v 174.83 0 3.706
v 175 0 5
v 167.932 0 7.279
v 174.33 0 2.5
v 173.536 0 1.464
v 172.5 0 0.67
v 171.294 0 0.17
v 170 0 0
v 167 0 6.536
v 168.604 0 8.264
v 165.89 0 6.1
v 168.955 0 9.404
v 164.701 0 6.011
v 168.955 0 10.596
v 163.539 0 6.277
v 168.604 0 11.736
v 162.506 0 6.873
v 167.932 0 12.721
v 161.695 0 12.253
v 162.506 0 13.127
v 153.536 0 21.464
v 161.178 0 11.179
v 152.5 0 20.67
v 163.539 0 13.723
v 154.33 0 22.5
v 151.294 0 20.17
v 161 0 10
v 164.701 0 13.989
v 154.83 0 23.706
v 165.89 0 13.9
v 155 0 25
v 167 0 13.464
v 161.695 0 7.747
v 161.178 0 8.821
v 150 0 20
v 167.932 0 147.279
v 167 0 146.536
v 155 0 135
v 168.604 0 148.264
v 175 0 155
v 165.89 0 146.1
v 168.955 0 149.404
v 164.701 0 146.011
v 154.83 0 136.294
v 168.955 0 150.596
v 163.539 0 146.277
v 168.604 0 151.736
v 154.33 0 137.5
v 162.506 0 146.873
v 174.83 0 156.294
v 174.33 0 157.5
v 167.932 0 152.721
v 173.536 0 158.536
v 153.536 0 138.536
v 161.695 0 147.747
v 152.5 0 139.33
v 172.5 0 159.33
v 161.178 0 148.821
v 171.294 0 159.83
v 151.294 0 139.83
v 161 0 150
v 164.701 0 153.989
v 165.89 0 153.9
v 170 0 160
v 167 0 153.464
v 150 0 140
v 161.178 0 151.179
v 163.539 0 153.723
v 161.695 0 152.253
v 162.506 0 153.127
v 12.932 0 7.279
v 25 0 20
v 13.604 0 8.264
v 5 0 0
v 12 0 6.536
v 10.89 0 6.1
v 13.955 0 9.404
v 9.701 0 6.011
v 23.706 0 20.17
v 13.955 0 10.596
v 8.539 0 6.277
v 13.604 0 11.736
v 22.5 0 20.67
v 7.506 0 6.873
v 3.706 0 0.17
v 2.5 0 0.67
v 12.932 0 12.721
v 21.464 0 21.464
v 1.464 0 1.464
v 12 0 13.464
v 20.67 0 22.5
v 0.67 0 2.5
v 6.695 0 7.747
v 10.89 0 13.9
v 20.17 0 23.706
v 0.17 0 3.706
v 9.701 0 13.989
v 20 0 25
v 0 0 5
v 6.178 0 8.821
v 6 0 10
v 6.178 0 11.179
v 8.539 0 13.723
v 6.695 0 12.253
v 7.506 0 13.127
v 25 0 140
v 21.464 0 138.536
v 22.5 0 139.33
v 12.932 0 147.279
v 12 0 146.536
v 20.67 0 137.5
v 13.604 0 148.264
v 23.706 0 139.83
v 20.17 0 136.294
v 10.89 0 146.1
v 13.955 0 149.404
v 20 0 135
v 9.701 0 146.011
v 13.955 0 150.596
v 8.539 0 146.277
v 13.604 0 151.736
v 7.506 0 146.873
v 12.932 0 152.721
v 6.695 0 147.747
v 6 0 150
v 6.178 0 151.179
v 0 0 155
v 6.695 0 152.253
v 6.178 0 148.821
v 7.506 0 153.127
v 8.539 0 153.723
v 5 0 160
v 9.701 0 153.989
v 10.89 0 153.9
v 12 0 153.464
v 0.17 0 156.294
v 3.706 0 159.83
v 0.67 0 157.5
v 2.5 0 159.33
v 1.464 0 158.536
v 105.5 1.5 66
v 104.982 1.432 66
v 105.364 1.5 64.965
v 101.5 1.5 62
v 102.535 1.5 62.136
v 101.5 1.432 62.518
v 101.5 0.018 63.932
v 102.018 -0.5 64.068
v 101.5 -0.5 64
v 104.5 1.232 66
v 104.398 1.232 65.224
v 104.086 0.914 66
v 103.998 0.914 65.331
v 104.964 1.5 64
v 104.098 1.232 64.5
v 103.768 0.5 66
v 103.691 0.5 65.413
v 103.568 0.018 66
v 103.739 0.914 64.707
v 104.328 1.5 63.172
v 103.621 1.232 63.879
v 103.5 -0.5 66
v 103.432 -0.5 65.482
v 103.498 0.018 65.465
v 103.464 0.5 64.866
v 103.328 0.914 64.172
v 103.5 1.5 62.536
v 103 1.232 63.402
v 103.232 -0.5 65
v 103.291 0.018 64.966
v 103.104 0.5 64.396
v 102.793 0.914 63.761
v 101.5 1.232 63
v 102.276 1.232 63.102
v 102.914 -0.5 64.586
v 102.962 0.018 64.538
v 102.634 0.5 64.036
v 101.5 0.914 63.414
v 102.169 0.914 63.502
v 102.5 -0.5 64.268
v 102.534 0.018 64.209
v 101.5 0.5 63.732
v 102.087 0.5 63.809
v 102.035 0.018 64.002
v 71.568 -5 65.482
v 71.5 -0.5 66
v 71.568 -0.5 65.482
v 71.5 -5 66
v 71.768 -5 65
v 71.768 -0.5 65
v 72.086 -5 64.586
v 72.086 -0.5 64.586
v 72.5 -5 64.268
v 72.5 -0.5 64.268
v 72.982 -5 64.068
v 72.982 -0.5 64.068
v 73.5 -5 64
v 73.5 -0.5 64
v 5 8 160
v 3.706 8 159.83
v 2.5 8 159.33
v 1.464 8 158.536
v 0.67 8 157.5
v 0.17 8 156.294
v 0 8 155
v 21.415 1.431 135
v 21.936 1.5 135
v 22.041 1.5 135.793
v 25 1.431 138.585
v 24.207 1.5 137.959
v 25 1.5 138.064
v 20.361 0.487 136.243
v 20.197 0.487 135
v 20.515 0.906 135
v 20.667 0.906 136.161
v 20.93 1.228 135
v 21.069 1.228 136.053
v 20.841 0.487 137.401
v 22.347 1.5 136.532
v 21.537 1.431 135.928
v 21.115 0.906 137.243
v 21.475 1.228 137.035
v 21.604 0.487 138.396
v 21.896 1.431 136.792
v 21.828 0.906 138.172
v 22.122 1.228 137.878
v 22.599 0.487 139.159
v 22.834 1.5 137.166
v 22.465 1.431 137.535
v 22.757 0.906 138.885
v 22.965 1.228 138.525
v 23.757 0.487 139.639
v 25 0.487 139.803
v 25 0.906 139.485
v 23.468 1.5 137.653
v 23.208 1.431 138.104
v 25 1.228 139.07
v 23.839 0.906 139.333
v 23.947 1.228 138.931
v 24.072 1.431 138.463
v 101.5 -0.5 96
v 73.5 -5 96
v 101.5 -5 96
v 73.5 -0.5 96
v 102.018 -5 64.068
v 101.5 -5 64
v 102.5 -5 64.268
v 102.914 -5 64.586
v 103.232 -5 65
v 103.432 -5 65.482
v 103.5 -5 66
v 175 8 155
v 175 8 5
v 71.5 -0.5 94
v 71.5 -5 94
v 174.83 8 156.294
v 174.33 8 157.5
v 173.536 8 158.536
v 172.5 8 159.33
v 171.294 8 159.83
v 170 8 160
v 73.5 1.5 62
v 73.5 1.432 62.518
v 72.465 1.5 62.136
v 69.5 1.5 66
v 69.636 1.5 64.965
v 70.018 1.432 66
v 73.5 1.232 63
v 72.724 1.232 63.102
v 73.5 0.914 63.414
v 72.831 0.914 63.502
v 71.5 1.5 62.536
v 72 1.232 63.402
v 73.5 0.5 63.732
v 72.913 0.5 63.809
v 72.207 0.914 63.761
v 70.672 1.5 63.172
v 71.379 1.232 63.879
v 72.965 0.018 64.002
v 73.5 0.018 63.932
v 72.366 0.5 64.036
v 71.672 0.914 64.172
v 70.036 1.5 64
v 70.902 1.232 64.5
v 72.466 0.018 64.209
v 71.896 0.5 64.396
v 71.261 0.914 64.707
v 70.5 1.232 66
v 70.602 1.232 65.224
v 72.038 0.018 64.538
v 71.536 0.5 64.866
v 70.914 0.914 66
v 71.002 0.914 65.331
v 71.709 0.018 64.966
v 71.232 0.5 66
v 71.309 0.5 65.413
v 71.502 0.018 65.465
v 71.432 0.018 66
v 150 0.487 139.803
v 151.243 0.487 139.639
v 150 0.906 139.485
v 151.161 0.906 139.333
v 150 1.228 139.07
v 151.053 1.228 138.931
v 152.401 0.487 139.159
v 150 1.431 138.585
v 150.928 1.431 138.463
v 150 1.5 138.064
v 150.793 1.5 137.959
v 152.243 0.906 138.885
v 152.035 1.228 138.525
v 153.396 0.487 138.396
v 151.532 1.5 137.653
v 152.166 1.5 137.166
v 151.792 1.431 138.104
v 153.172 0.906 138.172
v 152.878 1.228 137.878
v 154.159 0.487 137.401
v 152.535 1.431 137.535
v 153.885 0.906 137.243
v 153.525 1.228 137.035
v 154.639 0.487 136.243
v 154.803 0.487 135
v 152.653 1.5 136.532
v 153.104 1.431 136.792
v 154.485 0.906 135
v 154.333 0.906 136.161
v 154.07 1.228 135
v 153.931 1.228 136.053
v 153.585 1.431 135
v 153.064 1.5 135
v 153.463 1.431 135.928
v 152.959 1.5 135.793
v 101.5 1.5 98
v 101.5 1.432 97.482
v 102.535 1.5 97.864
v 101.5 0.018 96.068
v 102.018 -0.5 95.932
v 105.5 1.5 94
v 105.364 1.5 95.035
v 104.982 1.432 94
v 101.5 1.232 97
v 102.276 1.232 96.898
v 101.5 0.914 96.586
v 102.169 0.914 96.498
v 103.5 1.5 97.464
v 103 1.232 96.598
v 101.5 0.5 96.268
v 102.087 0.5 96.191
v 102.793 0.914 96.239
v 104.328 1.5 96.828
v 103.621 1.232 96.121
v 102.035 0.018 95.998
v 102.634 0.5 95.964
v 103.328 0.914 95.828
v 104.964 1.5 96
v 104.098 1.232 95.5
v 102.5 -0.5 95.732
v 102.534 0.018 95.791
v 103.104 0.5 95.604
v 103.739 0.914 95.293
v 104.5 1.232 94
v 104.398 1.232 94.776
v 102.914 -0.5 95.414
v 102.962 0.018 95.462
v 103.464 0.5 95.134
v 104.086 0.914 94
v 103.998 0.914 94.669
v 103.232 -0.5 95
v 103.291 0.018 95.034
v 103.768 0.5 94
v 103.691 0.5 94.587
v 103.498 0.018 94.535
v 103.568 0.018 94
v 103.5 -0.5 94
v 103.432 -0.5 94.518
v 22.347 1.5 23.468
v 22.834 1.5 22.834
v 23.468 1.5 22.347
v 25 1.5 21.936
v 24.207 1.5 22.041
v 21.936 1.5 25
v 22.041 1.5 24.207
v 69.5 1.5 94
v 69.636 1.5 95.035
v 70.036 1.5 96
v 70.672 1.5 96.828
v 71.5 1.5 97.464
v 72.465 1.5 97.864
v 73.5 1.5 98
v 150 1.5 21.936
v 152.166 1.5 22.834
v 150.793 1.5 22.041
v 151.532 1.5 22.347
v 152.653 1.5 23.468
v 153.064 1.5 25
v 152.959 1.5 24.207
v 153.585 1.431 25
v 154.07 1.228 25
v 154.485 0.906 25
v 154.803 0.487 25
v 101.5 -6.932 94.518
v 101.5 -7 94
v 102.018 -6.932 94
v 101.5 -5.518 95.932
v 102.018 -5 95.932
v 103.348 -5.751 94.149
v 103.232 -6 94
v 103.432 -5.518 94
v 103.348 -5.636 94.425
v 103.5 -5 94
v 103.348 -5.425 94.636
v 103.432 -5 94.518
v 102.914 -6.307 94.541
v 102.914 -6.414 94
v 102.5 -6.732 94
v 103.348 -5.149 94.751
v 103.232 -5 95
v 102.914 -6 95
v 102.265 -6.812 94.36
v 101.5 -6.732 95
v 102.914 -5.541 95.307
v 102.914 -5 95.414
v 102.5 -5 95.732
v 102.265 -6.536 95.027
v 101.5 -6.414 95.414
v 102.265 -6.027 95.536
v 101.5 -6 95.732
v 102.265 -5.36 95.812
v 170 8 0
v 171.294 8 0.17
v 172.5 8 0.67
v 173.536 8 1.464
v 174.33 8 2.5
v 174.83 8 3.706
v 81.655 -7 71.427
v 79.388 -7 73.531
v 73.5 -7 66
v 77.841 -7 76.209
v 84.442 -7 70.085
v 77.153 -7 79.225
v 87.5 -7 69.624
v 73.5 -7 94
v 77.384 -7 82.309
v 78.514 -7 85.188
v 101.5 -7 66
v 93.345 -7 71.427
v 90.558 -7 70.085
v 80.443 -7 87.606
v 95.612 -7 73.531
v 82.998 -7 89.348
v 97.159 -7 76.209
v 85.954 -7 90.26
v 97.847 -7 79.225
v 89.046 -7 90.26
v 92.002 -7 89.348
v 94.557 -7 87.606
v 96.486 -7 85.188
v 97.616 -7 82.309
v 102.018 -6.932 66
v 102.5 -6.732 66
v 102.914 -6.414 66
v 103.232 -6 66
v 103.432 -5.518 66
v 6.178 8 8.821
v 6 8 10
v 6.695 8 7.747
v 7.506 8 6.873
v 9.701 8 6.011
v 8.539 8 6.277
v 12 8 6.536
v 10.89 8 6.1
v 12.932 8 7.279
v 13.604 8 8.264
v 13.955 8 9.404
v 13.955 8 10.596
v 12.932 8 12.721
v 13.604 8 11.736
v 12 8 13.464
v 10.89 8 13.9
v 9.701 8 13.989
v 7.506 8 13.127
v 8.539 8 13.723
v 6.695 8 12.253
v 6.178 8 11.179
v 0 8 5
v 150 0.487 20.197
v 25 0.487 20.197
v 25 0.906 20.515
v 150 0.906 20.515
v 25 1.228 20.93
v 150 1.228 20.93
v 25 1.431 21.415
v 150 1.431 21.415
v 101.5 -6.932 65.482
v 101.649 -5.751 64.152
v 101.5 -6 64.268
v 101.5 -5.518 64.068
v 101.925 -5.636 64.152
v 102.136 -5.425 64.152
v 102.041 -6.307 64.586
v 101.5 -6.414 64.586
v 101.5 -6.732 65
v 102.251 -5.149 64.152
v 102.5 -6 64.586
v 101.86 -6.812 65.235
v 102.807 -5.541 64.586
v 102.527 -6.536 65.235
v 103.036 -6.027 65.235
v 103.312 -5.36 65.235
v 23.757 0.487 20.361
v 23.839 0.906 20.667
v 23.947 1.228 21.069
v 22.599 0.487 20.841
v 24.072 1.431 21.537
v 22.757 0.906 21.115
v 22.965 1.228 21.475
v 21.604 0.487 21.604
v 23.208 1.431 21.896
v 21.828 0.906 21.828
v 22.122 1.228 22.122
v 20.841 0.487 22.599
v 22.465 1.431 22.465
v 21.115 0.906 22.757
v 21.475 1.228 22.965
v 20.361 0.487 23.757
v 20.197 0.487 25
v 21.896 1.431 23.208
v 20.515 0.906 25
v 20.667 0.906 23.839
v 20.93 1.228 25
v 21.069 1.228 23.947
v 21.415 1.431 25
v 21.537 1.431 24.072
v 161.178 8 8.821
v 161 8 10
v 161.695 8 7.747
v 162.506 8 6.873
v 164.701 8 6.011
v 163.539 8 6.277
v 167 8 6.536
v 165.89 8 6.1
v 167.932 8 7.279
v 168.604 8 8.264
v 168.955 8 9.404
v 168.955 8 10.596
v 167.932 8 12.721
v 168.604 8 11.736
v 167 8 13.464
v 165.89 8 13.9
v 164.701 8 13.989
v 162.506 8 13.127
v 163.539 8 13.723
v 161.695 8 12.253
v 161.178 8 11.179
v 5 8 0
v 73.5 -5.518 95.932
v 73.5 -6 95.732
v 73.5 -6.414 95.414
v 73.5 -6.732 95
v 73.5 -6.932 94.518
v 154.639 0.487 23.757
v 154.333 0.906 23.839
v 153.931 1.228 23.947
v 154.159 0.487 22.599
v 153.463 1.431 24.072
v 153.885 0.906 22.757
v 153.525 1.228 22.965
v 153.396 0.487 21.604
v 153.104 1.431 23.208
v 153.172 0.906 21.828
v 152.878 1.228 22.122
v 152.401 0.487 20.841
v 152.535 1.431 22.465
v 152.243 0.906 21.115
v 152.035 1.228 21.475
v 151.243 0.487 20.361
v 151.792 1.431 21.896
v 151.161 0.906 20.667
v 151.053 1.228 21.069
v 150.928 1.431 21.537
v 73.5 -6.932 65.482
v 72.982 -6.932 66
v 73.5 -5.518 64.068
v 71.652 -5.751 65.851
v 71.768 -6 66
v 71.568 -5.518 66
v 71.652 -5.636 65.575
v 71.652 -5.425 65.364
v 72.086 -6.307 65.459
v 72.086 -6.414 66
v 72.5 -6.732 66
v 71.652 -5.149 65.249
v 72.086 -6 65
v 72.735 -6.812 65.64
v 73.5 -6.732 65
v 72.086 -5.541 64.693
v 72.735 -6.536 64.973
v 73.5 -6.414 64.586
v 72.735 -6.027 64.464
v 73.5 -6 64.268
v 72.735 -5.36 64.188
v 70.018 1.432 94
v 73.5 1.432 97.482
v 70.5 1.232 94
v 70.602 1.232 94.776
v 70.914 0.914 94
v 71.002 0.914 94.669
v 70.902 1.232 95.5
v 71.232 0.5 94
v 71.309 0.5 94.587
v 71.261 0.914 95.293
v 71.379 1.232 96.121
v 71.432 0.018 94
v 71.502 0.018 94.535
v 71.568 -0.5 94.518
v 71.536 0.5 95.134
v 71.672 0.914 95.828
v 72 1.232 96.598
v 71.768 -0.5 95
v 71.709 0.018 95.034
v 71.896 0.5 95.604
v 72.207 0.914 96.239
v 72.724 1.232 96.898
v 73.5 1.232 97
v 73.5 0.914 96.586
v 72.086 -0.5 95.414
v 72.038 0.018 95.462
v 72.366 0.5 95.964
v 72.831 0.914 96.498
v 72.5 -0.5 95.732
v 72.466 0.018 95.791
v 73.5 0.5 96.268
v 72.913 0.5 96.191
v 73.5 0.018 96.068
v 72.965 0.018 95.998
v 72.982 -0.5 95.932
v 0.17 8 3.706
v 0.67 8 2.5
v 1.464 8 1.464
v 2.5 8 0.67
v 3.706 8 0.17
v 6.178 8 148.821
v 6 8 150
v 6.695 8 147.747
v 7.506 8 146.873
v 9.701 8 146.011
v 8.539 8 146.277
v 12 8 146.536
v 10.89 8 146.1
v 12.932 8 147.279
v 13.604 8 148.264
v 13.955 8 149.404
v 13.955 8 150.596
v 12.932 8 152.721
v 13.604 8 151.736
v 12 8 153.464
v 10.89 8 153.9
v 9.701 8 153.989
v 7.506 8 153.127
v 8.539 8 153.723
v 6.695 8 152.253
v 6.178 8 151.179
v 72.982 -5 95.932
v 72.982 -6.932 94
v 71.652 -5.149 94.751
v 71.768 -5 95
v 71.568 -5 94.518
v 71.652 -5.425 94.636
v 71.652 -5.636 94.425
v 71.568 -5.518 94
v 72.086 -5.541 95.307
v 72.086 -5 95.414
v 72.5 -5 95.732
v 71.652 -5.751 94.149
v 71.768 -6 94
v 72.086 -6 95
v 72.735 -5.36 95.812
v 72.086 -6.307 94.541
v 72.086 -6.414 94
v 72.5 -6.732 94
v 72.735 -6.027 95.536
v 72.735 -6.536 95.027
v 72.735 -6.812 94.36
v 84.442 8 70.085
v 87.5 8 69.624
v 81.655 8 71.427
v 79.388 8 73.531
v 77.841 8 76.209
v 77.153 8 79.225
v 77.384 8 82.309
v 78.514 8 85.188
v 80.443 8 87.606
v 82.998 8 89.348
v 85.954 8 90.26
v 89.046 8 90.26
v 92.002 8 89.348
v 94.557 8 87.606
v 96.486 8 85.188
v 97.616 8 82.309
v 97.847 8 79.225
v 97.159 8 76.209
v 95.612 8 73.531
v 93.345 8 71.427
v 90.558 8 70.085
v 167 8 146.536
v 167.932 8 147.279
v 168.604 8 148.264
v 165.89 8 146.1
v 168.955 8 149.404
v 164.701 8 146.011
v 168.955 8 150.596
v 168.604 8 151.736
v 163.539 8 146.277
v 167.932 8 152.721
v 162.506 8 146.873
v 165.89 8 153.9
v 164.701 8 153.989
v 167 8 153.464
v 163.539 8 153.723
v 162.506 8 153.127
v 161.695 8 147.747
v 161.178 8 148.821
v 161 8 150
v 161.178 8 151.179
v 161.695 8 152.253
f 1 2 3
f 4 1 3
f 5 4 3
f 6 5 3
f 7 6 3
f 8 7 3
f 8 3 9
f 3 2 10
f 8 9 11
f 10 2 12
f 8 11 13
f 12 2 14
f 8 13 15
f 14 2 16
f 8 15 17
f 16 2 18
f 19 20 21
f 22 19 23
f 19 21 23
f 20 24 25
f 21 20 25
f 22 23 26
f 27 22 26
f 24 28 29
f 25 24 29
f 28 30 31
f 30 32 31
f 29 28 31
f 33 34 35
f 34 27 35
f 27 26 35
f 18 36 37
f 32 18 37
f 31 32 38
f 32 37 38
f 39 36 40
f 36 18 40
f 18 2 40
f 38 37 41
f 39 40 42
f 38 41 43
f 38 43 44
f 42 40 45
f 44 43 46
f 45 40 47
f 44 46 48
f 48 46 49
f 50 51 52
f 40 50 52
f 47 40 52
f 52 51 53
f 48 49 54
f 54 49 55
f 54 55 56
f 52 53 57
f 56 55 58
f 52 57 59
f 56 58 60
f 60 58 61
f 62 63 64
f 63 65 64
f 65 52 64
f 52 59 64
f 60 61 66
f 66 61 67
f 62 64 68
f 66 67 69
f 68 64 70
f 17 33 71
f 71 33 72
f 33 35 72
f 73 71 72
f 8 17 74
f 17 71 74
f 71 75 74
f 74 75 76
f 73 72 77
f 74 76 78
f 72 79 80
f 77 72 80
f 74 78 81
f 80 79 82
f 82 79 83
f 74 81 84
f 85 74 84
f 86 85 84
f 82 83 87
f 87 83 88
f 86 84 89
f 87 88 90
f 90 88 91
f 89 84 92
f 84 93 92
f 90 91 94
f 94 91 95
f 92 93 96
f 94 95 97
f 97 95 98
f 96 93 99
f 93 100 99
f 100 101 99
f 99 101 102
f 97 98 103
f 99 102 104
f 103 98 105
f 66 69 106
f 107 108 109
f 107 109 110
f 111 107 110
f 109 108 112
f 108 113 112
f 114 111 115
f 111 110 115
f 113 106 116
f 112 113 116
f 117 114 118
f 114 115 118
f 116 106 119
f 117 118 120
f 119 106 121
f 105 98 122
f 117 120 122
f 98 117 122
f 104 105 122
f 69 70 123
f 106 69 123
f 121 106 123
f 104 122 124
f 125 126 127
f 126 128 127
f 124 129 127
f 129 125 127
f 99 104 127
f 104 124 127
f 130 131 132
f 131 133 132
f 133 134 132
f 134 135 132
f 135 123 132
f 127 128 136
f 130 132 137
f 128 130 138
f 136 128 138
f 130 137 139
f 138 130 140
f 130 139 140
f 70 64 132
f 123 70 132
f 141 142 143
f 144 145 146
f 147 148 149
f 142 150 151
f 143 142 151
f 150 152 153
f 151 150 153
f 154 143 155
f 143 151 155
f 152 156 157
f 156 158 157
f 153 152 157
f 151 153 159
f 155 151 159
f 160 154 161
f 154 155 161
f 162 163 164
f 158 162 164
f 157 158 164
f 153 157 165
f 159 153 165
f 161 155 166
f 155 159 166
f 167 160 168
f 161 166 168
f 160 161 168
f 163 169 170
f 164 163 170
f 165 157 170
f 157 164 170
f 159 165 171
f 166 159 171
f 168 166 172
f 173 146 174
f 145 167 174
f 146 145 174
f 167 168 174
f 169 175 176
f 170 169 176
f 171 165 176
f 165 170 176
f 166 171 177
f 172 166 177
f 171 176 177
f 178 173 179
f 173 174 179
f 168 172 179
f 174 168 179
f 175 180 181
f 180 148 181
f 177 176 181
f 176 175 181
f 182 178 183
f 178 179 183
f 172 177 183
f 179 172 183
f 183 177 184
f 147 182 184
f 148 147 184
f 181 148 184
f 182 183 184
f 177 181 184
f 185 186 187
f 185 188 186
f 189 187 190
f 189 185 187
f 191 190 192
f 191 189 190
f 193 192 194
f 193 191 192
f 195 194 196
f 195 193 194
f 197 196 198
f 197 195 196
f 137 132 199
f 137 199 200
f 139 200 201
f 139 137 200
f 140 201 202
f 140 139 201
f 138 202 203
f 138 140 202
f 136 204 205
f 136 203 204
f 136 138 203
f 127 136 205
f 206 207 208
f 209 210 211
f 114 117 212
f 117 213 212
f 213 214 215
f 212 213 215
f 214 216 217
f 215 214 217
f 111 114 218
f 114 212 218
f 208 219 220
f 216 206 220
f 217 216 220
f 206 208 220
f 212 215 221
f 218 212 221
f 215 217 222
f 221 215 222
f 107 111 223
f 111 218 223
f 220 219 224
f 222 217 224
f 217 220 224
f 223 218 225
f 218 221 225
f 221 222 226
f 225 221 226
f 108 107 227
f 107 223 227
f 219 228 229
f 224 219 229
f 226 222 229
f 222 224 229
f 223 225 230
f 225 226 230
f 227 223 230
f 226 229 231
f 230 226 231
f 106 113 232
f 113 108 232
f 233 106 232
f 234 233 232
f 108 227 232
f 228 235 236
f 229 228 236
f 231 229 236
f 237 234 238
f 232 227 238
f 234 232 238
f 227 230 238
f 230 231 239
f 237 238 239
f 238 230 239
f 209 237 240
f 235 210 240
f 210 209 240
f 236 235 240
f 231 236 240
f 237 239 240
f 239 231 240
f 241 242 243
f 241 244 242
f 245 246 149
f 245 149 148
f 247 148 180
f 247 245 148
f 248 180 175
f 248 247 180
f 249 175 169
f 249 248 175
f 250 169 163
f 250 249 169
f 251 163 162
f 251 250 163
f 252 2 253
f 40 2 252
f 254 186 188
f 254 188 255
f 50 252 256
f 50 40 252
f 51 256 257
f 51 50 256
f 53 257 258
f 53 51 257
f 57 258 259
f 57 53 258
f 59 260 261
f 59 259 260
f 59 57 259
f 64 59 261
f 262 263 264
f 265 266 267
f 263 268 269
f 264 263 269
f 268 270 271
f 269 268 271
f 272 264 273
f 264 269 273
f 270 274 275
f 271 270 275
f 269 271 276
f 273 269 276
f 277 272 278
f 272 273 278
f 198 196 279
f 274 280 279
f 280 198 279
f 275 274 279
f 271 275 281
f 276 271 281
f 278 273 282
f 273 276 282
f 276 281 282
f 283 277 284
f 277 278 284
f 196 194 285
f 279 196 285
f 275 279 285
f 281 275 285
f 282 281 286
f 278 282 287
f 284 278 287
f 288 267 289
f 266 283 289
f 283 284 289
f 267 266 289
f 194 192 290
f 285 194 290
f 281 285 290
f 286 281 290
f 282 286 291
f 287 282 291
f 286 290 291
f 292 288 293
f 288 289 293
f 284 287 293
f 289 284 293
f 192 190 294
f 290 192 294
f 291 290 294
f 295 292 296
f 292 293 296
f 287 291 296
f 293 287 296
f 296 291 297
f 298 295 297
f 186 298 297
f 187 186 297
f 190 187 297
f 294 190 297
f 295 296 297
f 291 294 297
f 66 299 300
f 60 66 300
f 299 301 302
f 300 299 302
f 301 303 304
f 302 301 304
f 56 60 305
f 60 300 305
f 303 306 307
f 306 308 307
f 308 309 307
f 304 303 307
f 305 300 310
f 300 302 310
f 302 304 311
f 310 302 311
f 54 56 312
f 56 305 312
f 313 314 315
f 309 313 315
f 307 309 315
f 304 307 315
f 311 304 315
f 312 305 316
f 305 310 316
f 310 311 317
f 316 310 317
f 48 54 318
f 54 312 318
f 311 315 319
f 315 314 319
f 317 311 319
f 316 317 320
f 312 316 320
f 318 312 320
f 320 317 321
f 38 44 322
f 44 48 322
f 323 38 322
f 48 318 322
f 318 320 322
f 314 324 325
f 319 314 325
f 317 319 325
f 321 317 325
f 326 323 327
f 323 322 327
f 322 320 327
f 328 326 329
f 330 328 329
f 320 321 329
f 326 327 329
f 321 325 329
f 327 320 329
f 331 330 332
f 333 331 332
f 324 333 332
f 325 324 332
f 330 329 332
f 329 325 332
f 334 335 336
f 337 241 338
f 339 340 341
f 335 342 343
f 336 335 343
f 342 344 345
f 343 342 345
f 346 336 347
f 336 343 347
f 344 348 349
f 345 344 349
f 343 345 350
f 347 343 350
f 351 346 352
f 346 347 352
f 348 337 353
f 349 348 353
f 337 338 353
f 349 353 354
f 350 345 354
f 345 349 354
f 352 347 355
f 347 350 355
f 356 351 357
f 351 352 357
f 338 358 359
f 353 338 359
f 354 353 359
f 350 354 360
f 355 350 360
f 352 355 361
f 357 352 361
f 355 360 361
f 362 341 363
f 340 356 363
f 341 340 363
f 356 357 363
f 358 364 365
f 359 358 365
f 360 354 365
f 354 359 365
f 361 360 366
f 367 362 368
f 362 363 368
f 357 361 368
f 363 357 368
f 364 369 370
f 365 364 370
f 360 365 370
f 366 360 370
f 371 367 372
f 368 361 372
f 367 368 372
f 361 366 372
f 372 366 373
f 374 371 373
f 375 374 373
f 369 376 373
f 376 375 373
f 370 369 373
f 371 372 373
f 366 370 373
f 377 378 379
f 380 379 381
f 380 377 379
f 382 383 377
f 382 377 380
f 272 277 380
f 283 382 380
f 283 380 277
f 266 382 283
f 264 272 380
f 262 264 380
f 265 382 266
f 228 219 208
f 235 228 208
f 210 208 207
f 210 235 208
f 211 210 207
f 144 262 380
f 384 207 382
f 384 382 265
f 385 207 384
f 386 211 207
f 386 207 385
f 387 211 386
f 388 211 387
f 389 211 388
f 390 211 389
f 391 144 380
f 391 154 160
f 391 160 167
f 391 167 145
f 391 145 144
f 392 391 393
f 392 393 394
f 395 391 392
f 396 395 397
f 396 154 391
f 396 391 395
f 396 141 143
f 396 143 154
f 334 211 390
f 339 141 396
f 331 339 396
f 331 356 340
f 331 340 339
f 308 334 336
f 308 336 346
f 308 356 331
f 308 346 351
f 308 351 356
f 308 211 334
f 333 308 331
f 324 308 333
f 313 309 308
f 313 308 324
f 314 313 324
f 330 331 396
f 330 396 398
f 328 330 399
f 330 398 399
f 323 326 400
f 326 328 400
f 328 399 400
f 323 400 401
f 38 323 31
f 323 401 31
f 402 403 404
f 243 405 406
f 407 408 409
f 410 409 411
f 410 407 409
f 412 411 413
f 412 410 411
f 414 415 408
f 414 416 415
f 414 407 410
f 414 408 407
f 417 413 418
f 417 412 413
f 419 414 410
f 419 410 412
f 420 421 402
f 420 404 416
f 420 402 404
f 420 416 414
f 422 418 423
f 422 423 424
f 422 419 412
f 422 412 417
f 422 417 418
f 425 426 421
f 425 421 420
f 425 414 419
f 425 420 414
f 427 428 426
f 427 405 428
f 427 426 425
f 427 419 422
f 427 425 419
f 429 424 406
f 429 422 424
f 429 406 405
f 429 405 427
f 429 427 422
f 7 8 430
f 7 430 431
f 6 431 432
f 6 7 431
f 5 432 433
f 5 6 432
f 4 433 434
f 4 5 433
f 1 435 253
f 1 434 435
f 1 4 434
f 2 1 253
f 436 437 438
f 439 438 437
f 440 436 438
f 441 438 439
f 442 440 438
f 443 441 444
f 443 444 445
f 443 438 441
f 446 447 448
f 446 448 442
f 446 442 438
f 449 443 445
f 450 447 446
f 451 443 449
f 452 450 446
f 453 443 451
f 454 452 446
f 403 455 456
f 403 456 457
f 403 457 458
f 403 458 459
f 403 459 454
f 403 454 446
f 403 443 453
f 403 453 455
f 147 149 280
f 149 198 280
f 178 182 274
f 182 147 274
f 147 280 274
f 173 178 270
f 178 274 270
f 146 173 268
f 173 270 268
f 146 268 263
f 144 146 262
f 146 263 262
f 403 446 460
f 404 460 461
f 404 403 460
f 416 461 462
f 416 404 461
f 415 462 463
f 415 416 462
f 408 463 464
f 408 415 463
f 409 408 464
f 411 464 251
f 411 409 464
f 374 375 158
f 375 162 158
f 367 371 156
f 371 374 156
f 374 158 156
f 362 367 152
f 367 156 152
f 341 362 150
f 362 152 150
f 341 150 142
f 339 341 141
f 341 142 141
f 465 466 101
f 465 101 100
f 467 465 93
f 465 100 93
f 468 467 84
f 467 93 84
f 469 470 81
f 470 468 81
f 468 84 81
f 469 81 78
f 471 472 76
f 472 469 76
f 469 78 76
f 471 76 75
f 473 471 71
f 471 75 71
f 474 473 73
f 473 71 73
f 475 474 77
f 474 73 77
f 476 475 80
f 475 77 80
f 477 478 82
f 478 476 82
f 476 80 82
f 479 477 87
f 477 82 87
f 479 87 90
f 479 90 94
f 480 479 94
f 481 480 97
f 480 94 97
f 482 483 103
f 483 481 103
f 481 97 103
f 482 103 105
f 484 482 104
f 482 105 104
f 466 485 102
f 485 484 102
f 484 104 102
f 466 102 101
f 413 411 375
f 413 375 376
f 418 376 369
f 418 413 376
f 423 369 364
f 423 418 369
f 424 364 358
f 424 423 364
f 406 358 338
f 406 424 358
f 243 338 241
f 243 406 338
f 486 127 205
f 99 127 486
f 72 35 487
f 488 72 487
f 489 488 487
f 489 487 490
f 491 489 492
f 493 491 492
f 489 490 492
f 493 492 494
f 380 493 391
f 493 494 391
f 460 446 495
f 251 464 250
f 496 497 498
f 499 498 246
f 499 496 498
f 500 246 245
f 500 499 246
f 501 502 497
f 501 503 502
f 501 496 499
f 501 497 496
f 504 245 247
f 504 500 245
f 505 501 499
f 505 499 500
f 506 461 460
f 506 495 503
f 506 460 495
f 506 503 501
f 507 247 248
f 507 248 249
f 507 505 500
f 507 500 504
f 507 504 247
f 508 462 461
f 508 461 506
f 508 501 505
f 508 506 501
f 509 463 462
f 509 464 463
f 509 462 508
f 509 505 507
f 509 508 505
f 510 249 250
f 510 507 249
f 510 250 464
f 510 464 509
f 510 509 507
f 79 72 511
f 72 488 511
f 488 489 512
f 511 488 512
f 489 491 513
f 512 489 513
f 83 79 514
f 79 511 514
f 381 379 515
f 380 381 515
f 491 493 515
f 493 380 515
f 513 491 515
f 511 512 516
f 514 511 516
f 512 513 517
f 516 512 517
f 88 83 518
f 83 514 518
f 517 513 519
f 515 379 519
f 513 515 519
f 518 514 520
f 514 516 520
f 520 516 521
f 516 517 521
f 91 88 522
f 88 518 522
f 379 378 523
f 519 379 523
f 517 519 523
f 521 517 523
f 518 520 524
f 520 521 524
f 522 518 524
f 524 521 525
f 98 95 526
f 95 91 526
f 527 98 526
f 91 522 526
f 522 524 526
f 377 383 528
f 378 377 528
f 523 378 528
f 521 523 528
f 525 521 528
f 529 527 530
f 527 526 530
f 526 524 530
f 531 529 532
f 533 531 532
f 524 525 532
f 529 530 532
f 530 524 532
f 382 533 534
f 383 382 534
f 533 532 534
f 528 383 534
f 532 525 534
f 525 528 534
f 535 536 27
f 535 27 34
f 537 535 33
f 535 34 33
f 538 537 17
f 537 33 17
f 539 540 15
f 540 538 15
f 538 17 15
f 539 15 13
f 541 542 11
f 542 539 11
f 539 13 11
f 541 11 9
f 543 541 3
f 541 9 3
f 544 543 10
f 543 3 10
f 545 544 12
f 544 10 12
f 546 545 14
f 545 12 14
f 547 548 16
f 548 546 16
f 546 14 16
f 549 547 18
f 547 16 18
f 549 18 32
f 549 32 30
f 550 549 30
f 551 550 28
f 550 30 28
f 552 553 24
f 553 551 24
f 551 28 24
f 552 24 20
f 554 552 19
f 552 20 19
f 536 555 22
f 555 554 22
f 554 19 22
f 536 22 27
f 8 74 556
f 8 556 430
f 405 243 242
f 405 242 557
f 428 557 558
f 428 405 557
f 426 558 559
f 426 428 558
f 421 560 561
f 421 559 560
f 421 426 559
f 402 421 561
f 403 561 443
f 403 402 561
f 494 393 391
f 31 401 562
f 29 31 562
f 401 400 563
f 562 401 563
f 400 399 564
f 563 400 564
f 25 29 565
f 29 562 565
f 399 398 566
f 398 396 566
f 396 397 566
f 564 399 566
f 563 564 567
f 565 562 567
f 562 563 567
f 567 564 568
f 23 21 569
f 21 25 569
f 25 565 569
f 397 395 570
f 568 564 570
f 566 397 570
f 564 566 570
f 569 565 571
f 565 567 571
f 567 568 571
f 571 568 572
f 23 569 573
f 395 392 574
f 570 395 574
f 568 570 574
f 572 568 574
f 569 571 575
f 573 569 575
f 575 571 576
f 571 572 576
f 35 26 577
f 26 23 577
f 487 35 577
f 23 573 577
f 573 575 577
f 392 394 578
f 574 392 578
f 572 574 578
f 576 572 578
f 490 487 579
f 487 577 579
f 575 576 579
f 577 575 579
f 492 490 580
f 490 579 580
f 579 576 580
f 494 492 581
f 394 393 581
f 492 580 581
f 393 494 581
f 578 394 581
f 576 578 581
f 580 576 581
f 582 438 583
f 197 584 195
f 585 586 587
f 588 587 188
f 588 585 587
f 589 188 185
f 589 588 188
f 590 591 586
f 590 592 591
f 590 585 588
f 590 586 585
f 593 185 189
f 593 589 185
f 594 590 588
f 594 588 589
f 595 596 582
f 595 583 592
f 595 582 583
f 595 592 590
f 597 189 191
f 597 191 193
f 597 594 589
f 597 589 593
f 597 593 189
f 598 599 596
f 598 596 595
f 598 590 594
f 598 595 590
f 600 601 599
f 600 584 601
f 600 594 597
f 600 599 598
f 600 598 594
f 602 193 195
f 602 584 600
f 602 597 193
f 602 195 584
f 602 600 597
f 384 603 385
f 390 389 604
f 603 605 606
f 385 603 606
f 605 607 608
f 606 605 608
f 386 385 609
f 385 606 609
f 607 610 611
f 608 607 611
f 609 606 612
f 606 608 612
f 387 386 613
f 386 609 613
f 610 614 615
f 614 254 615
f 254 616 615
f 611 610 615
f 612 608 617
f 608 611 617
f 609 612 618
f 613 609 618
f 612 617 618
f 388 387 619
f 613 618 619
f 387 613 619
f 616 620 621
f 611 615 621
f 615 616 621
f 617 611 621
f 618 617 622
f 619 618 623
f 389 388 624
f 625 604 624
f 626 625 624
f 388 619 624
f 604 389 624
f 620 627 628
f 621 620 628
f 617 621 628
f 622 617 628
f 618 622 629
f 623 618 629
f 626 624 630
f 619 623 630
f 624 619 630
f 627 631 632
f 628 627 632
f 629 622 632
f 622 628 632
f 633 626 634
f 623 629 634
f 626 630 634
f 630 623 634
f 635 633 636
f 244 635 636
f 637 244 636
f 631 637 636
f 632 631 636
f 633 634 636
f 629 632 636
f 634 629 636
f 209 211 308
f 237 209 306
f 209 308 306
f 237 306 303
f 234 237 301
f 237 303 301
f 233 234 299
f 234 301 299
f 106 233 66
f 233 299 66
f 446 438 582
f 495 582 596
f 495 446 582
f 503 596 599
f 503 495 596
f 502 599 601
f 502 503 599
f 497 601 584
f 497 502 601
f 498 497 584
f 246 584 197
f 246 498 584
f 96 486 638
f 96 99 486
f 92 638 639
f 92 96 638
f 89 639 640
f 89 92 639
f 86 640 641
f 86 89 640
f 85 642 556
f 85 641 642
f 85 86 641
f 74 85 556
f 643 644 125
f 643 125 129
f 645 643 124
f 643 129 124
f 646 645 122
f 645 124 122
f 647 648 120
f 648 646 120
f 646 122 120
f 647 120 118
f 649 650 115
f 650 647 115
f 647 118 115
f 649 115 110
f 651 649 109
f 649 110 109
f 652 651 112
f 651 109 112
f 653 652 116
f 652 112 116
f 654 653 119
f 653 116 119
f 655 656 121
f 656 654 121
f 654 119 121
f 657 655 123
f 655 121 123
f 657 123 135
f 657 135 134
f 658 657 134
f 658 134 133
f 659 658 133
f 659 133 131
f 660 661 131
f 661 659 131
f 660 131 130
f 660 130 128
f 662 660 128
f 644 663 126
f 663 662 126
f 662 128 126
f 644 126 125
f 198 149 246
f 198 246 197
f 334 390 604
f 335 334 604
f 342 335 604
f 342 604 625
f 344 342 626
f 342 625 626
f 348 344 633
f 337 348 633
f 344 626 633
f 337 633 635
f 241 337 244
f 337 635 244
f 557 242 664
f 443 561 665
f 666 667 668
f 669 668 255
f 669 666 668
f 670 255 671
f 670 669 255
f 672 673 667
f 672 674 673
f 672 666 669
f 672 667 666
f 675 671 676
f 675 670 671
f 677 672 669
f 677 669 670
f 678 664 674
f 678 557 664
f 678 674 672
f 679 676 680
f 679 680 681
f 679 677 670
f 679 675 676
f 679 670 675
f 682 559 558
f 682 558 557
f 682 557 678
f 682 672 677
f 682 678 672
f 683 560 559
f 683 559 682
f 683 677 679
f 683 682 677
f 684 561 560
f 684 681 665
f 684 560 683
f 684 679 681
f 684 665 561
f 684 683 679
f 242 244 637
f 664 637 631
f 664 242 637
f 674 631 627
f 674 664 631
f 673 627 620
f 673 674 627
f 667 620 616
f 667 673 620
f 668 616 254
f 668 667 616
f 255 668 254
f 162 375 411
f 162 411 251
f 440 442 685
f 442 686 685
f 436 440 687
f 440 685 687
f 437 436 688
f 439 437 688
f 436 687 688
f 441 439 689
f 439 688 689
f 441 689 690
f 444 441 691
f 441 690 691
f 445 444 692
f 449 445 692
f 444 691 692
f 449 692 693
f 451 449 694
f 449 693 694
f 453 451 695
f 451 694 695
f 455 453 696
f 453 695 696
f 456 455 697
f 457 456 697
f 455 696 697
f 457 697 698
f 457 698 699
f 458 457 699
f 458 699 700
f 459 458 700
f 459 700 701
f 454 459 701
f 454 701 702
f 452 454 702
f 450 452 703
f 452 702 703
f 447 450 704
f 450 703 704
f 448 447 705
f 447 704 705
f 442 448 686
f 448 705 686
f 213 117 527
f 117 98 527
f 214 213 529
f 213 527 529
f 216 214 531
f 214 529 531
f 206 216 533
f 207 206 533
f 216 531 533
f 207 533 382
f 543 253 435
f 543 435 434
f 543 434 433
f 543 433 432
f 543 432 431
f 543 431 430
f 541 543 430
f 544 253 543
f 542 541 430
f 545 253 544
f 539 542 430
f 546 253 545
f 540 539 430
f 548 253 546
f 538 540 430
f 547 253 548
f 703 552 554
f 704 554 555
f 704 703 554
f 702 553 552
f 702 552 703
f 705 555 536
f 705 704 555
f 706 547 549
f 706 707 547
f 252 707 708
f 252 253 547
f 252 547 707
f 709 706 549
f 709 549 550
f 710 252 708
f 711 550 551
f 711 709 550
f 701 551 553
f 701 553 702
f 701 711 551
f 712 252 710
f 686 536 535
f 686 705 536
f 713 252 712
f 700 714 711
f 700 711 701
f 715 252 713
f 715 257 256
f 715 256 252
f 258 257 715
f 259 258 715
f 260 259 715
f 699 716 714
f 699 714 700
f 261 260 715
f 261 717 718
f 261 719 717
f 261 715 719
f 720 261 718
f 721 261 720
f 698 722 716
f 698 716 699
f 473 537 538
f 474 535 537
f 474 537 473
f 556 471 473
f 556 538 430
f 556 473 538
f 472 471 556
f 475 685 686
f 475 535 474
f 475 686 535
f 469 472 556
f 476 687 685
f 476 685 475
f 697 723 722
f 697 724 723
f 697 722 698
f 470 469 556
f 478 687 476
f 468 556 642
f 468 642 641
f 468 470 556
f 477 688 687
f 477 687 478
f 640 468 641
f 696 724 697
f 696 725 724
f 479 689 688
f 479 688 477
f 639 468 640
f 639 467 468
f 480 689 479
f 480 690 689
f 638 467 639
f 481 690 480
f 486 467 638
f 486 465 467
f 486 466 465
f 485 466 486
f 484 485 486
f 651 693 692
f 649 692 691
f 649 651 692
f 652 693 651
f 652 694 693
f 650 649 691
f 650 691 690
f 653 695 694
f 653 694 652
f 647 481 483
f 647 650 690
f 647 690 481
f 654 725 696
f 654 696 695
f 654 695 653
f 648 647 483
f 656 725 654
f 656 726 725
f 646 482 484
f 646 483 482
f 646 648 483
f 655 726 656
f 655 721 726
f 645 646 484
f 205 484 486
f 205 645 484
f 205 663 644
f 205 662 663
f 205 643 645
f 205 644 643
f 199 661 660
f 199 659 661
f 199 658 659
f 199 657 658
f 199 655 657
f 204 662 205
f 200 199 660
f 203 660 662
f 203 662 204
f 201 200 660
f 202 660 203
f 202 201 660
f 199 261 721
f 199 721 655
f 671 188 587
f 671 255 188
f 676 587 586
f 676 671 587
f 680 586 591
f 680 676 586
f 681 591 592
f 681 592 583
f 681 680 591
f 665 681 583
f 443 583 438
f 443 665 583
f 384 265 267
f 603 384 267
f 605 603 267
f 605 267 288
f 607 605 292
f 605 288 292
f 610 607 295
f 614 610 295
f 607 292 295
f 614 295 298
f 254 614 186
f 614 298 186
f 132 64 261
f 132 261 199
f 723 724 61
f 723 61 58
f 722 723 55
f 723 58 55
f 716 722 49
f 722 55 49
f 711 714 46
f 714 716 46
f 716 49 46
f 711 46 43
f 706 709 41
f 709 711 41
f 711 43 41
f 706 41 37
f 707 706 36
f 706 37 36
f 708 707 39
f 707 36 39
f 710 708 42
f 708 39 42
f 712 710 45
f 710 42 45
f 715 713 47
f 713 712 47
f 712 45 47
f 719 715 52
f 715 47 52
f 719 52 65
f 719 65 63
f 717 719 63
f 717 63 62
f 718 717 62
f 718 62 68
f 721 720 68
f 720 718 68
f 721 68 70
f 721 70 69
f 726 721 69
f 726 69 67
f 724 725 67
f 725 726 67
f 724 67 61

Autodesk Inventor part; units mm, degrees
ref_plane "YZ Plane" through (0, 0, 0) normal (1, 0, 0) x (0, 1, 0)
ref_plane "XZ Plane" through (0, 0, 0) normal (0, 1, 0) x (-1, 0, 0)
ref_plane "XY Plane" through (0, 0, 0) normal (0, 0, 1) x (1, 0, 0)
sketch "草图1" plane through (0, 0, 0) normal (0, 1, 0) x (-1, 0, 0)
  line L0 (-5, 0) -> (-170, 0)
  line L1 (-175, 5) -> (-175, 155)
  line L2 (-170, 160) -> (-5, 160)
  line L3 (0, 155) -> (0, 5)
  line L4 (22.306, 80) -> (-199.7113, 80)
  line L5 (-87.5, 206.246) -> (-87.5, -79.95)
  circle A0 centre (-10, 150) radius 4
  circle A1 centre (-10, 10) radius 4
  circle A2 centre (-165, 150) radius 4
  circle A3 centre (-165, 10) radius 4
  arc A4 (0, 155) -> (-5, 160) centre (-5, 155) ccw
  arc A5 (-5, 0) -> (0, 5) centre (-5, 5) ccw
  arc A6 (-175, 5) -> (-170, 0) centre (-170, 5) ccw
  arc A7 (-170, 160) -> (-175, 155) centre (-170, 155) ccw
  point P0 (0, 0)
  point P1 (-175, 0)
  point P2 (0, 160)
  point P3 (-87.5, 160)
  point P4 (0, 80)
  point P5 (-87.5, 80)
  point P6 (-87.5, 0)
  point P7 (-87.5, 80)
  dimension "d0" = 160
  dimension "d1" = 175
  dimension "d2" = 8
  dimension "d6" = 140
  dimension "d9" = 155
  dimension "d12" = 5
extrude "拉伸1" add sketch "草图1" along normal blind 8
sketch "草图2" plane through (0, 0, 0) normal (0, -1, 0) x (1, 0, 0)
  line L0 (150, 140) -> (25, 140)
  line L1 (20, 135) -> (20, 25)
  line L2 (25, 20) -> (150, 20)
  line L3 (155, 25) -> (155, 135)
  arc A0 (155, 135) -> (150, 140) centre (150, 135) ccw
  arc A1 (150, 20) -> (155, 25) centre (150, 25) ccw
  arc A2 (20, 25) -> (25, 20) centre (25, 25) ccw
  arc A3 (25, 140) -> (20, 135) centre (25, 135) ccw
  line L4 (87.5, 206.246) -> (87.5, -79.95) projected
  line L5 (-22.306, 80) -> (199.7113, 80) projected
  point P0 (0, 0)
  point P1 (87.5, 140)
  point P2 (155, 80)
  dimension "d15" = 5
  dimension "d16" = 120
  dimension "d17" = 135
extrude "拉伸2" cut sketch "草图2" against normal blind 1.5
fillet "圆角1" radius 2 8 edges at (153.5355, 1.5, 138.5355) (155, 1.5, 80) (153.5355, 1.5, 21.4645) (87.5, 1.5, 20) (21.4645, 1.5, 21.4645) (20, 1.5, 80) (21.4645, 1.5, 138.5355) (87.5, 1.5, 140)
sketch "草图3" plane through (0, 1.5, 0) normal (0, -1, 0) x (1, 0, 0)
  line L0 (71.5, 96) -> (103.5, 96)
  line L1 (103.5, 96) -> (103.5, 64)
  line L2 (103.5, 64) -> (71.5, 64)
  line L3 (71.5, 64) -> (71.5, 96)
  line L4 (-22.306, 80) -> (199.7113, 80) projected
  line L5 (87.5, 206.246) -> (87.5, -79.95) projected
  point P0 (0, 0)
  point P1 (71.5, 80)
  point P2 (87.5, 96)
  dimension "d28" = 32
extrude "拉伸3" add sketch "草图3" along normal blind 8.5
fillet "圆角2" radius 2 12 edges at (87.5, -7, 96) (103.5, -7, 80) (87.5, -7, 64) (71.5, -7, 80) (87.5, 1.5, 96) (71.5, 1.5, 80) (103.5, 1.5, 80) (87.5, 1.5, 64) (71.5, -2.75, 96) (71.5, -2.75, 64) (103.5, -2.75, 64) (103.5, -2.75, 96)
sketch "草图4" plane through (0, -7, 0) normal (0, -1, 0) x (1, 0, 0)
  line L0 (-22.306, 80) -> (199.7113, 80) projected
  line L1 (87.5, 206.246) -> (87.5, -79.95) projected
  point P0 (0, 0)
  point P1 (87.5, 80)
hole "孔2" at (87.5, -7, 80) direction (0, 1, 0) diameter 20.752 end through all thread size "M24x3" designation "M24" class "6H" standard "GB Metric profile"
equation "\"d0\" = A1"
equation "\"d1\" = B1"
equation "\"d2\" = d4"
equation "\"d6\" = A2"
equation "\"d9\" = B2"
equation "\"d12\" = R"
equation "\"d13\" = h_"
equation "\"d15\" = R"
equation "\"d16\" = A_"
equation "\"d17\" = B"
equation "\"d4\" = 8"
equation "\"A2\" = 140"
equation "\"B2\" = 155"
equation "\"R\" = 5"
equation "\"h_\" = 8"
equation "\"A_\" = 120"
equation "\"B\" = 135"
equation "\"A1\" = 160"
equation "\"B1\" = 175"
properties part number "盖板" material "聚碳酸酯，透明"
